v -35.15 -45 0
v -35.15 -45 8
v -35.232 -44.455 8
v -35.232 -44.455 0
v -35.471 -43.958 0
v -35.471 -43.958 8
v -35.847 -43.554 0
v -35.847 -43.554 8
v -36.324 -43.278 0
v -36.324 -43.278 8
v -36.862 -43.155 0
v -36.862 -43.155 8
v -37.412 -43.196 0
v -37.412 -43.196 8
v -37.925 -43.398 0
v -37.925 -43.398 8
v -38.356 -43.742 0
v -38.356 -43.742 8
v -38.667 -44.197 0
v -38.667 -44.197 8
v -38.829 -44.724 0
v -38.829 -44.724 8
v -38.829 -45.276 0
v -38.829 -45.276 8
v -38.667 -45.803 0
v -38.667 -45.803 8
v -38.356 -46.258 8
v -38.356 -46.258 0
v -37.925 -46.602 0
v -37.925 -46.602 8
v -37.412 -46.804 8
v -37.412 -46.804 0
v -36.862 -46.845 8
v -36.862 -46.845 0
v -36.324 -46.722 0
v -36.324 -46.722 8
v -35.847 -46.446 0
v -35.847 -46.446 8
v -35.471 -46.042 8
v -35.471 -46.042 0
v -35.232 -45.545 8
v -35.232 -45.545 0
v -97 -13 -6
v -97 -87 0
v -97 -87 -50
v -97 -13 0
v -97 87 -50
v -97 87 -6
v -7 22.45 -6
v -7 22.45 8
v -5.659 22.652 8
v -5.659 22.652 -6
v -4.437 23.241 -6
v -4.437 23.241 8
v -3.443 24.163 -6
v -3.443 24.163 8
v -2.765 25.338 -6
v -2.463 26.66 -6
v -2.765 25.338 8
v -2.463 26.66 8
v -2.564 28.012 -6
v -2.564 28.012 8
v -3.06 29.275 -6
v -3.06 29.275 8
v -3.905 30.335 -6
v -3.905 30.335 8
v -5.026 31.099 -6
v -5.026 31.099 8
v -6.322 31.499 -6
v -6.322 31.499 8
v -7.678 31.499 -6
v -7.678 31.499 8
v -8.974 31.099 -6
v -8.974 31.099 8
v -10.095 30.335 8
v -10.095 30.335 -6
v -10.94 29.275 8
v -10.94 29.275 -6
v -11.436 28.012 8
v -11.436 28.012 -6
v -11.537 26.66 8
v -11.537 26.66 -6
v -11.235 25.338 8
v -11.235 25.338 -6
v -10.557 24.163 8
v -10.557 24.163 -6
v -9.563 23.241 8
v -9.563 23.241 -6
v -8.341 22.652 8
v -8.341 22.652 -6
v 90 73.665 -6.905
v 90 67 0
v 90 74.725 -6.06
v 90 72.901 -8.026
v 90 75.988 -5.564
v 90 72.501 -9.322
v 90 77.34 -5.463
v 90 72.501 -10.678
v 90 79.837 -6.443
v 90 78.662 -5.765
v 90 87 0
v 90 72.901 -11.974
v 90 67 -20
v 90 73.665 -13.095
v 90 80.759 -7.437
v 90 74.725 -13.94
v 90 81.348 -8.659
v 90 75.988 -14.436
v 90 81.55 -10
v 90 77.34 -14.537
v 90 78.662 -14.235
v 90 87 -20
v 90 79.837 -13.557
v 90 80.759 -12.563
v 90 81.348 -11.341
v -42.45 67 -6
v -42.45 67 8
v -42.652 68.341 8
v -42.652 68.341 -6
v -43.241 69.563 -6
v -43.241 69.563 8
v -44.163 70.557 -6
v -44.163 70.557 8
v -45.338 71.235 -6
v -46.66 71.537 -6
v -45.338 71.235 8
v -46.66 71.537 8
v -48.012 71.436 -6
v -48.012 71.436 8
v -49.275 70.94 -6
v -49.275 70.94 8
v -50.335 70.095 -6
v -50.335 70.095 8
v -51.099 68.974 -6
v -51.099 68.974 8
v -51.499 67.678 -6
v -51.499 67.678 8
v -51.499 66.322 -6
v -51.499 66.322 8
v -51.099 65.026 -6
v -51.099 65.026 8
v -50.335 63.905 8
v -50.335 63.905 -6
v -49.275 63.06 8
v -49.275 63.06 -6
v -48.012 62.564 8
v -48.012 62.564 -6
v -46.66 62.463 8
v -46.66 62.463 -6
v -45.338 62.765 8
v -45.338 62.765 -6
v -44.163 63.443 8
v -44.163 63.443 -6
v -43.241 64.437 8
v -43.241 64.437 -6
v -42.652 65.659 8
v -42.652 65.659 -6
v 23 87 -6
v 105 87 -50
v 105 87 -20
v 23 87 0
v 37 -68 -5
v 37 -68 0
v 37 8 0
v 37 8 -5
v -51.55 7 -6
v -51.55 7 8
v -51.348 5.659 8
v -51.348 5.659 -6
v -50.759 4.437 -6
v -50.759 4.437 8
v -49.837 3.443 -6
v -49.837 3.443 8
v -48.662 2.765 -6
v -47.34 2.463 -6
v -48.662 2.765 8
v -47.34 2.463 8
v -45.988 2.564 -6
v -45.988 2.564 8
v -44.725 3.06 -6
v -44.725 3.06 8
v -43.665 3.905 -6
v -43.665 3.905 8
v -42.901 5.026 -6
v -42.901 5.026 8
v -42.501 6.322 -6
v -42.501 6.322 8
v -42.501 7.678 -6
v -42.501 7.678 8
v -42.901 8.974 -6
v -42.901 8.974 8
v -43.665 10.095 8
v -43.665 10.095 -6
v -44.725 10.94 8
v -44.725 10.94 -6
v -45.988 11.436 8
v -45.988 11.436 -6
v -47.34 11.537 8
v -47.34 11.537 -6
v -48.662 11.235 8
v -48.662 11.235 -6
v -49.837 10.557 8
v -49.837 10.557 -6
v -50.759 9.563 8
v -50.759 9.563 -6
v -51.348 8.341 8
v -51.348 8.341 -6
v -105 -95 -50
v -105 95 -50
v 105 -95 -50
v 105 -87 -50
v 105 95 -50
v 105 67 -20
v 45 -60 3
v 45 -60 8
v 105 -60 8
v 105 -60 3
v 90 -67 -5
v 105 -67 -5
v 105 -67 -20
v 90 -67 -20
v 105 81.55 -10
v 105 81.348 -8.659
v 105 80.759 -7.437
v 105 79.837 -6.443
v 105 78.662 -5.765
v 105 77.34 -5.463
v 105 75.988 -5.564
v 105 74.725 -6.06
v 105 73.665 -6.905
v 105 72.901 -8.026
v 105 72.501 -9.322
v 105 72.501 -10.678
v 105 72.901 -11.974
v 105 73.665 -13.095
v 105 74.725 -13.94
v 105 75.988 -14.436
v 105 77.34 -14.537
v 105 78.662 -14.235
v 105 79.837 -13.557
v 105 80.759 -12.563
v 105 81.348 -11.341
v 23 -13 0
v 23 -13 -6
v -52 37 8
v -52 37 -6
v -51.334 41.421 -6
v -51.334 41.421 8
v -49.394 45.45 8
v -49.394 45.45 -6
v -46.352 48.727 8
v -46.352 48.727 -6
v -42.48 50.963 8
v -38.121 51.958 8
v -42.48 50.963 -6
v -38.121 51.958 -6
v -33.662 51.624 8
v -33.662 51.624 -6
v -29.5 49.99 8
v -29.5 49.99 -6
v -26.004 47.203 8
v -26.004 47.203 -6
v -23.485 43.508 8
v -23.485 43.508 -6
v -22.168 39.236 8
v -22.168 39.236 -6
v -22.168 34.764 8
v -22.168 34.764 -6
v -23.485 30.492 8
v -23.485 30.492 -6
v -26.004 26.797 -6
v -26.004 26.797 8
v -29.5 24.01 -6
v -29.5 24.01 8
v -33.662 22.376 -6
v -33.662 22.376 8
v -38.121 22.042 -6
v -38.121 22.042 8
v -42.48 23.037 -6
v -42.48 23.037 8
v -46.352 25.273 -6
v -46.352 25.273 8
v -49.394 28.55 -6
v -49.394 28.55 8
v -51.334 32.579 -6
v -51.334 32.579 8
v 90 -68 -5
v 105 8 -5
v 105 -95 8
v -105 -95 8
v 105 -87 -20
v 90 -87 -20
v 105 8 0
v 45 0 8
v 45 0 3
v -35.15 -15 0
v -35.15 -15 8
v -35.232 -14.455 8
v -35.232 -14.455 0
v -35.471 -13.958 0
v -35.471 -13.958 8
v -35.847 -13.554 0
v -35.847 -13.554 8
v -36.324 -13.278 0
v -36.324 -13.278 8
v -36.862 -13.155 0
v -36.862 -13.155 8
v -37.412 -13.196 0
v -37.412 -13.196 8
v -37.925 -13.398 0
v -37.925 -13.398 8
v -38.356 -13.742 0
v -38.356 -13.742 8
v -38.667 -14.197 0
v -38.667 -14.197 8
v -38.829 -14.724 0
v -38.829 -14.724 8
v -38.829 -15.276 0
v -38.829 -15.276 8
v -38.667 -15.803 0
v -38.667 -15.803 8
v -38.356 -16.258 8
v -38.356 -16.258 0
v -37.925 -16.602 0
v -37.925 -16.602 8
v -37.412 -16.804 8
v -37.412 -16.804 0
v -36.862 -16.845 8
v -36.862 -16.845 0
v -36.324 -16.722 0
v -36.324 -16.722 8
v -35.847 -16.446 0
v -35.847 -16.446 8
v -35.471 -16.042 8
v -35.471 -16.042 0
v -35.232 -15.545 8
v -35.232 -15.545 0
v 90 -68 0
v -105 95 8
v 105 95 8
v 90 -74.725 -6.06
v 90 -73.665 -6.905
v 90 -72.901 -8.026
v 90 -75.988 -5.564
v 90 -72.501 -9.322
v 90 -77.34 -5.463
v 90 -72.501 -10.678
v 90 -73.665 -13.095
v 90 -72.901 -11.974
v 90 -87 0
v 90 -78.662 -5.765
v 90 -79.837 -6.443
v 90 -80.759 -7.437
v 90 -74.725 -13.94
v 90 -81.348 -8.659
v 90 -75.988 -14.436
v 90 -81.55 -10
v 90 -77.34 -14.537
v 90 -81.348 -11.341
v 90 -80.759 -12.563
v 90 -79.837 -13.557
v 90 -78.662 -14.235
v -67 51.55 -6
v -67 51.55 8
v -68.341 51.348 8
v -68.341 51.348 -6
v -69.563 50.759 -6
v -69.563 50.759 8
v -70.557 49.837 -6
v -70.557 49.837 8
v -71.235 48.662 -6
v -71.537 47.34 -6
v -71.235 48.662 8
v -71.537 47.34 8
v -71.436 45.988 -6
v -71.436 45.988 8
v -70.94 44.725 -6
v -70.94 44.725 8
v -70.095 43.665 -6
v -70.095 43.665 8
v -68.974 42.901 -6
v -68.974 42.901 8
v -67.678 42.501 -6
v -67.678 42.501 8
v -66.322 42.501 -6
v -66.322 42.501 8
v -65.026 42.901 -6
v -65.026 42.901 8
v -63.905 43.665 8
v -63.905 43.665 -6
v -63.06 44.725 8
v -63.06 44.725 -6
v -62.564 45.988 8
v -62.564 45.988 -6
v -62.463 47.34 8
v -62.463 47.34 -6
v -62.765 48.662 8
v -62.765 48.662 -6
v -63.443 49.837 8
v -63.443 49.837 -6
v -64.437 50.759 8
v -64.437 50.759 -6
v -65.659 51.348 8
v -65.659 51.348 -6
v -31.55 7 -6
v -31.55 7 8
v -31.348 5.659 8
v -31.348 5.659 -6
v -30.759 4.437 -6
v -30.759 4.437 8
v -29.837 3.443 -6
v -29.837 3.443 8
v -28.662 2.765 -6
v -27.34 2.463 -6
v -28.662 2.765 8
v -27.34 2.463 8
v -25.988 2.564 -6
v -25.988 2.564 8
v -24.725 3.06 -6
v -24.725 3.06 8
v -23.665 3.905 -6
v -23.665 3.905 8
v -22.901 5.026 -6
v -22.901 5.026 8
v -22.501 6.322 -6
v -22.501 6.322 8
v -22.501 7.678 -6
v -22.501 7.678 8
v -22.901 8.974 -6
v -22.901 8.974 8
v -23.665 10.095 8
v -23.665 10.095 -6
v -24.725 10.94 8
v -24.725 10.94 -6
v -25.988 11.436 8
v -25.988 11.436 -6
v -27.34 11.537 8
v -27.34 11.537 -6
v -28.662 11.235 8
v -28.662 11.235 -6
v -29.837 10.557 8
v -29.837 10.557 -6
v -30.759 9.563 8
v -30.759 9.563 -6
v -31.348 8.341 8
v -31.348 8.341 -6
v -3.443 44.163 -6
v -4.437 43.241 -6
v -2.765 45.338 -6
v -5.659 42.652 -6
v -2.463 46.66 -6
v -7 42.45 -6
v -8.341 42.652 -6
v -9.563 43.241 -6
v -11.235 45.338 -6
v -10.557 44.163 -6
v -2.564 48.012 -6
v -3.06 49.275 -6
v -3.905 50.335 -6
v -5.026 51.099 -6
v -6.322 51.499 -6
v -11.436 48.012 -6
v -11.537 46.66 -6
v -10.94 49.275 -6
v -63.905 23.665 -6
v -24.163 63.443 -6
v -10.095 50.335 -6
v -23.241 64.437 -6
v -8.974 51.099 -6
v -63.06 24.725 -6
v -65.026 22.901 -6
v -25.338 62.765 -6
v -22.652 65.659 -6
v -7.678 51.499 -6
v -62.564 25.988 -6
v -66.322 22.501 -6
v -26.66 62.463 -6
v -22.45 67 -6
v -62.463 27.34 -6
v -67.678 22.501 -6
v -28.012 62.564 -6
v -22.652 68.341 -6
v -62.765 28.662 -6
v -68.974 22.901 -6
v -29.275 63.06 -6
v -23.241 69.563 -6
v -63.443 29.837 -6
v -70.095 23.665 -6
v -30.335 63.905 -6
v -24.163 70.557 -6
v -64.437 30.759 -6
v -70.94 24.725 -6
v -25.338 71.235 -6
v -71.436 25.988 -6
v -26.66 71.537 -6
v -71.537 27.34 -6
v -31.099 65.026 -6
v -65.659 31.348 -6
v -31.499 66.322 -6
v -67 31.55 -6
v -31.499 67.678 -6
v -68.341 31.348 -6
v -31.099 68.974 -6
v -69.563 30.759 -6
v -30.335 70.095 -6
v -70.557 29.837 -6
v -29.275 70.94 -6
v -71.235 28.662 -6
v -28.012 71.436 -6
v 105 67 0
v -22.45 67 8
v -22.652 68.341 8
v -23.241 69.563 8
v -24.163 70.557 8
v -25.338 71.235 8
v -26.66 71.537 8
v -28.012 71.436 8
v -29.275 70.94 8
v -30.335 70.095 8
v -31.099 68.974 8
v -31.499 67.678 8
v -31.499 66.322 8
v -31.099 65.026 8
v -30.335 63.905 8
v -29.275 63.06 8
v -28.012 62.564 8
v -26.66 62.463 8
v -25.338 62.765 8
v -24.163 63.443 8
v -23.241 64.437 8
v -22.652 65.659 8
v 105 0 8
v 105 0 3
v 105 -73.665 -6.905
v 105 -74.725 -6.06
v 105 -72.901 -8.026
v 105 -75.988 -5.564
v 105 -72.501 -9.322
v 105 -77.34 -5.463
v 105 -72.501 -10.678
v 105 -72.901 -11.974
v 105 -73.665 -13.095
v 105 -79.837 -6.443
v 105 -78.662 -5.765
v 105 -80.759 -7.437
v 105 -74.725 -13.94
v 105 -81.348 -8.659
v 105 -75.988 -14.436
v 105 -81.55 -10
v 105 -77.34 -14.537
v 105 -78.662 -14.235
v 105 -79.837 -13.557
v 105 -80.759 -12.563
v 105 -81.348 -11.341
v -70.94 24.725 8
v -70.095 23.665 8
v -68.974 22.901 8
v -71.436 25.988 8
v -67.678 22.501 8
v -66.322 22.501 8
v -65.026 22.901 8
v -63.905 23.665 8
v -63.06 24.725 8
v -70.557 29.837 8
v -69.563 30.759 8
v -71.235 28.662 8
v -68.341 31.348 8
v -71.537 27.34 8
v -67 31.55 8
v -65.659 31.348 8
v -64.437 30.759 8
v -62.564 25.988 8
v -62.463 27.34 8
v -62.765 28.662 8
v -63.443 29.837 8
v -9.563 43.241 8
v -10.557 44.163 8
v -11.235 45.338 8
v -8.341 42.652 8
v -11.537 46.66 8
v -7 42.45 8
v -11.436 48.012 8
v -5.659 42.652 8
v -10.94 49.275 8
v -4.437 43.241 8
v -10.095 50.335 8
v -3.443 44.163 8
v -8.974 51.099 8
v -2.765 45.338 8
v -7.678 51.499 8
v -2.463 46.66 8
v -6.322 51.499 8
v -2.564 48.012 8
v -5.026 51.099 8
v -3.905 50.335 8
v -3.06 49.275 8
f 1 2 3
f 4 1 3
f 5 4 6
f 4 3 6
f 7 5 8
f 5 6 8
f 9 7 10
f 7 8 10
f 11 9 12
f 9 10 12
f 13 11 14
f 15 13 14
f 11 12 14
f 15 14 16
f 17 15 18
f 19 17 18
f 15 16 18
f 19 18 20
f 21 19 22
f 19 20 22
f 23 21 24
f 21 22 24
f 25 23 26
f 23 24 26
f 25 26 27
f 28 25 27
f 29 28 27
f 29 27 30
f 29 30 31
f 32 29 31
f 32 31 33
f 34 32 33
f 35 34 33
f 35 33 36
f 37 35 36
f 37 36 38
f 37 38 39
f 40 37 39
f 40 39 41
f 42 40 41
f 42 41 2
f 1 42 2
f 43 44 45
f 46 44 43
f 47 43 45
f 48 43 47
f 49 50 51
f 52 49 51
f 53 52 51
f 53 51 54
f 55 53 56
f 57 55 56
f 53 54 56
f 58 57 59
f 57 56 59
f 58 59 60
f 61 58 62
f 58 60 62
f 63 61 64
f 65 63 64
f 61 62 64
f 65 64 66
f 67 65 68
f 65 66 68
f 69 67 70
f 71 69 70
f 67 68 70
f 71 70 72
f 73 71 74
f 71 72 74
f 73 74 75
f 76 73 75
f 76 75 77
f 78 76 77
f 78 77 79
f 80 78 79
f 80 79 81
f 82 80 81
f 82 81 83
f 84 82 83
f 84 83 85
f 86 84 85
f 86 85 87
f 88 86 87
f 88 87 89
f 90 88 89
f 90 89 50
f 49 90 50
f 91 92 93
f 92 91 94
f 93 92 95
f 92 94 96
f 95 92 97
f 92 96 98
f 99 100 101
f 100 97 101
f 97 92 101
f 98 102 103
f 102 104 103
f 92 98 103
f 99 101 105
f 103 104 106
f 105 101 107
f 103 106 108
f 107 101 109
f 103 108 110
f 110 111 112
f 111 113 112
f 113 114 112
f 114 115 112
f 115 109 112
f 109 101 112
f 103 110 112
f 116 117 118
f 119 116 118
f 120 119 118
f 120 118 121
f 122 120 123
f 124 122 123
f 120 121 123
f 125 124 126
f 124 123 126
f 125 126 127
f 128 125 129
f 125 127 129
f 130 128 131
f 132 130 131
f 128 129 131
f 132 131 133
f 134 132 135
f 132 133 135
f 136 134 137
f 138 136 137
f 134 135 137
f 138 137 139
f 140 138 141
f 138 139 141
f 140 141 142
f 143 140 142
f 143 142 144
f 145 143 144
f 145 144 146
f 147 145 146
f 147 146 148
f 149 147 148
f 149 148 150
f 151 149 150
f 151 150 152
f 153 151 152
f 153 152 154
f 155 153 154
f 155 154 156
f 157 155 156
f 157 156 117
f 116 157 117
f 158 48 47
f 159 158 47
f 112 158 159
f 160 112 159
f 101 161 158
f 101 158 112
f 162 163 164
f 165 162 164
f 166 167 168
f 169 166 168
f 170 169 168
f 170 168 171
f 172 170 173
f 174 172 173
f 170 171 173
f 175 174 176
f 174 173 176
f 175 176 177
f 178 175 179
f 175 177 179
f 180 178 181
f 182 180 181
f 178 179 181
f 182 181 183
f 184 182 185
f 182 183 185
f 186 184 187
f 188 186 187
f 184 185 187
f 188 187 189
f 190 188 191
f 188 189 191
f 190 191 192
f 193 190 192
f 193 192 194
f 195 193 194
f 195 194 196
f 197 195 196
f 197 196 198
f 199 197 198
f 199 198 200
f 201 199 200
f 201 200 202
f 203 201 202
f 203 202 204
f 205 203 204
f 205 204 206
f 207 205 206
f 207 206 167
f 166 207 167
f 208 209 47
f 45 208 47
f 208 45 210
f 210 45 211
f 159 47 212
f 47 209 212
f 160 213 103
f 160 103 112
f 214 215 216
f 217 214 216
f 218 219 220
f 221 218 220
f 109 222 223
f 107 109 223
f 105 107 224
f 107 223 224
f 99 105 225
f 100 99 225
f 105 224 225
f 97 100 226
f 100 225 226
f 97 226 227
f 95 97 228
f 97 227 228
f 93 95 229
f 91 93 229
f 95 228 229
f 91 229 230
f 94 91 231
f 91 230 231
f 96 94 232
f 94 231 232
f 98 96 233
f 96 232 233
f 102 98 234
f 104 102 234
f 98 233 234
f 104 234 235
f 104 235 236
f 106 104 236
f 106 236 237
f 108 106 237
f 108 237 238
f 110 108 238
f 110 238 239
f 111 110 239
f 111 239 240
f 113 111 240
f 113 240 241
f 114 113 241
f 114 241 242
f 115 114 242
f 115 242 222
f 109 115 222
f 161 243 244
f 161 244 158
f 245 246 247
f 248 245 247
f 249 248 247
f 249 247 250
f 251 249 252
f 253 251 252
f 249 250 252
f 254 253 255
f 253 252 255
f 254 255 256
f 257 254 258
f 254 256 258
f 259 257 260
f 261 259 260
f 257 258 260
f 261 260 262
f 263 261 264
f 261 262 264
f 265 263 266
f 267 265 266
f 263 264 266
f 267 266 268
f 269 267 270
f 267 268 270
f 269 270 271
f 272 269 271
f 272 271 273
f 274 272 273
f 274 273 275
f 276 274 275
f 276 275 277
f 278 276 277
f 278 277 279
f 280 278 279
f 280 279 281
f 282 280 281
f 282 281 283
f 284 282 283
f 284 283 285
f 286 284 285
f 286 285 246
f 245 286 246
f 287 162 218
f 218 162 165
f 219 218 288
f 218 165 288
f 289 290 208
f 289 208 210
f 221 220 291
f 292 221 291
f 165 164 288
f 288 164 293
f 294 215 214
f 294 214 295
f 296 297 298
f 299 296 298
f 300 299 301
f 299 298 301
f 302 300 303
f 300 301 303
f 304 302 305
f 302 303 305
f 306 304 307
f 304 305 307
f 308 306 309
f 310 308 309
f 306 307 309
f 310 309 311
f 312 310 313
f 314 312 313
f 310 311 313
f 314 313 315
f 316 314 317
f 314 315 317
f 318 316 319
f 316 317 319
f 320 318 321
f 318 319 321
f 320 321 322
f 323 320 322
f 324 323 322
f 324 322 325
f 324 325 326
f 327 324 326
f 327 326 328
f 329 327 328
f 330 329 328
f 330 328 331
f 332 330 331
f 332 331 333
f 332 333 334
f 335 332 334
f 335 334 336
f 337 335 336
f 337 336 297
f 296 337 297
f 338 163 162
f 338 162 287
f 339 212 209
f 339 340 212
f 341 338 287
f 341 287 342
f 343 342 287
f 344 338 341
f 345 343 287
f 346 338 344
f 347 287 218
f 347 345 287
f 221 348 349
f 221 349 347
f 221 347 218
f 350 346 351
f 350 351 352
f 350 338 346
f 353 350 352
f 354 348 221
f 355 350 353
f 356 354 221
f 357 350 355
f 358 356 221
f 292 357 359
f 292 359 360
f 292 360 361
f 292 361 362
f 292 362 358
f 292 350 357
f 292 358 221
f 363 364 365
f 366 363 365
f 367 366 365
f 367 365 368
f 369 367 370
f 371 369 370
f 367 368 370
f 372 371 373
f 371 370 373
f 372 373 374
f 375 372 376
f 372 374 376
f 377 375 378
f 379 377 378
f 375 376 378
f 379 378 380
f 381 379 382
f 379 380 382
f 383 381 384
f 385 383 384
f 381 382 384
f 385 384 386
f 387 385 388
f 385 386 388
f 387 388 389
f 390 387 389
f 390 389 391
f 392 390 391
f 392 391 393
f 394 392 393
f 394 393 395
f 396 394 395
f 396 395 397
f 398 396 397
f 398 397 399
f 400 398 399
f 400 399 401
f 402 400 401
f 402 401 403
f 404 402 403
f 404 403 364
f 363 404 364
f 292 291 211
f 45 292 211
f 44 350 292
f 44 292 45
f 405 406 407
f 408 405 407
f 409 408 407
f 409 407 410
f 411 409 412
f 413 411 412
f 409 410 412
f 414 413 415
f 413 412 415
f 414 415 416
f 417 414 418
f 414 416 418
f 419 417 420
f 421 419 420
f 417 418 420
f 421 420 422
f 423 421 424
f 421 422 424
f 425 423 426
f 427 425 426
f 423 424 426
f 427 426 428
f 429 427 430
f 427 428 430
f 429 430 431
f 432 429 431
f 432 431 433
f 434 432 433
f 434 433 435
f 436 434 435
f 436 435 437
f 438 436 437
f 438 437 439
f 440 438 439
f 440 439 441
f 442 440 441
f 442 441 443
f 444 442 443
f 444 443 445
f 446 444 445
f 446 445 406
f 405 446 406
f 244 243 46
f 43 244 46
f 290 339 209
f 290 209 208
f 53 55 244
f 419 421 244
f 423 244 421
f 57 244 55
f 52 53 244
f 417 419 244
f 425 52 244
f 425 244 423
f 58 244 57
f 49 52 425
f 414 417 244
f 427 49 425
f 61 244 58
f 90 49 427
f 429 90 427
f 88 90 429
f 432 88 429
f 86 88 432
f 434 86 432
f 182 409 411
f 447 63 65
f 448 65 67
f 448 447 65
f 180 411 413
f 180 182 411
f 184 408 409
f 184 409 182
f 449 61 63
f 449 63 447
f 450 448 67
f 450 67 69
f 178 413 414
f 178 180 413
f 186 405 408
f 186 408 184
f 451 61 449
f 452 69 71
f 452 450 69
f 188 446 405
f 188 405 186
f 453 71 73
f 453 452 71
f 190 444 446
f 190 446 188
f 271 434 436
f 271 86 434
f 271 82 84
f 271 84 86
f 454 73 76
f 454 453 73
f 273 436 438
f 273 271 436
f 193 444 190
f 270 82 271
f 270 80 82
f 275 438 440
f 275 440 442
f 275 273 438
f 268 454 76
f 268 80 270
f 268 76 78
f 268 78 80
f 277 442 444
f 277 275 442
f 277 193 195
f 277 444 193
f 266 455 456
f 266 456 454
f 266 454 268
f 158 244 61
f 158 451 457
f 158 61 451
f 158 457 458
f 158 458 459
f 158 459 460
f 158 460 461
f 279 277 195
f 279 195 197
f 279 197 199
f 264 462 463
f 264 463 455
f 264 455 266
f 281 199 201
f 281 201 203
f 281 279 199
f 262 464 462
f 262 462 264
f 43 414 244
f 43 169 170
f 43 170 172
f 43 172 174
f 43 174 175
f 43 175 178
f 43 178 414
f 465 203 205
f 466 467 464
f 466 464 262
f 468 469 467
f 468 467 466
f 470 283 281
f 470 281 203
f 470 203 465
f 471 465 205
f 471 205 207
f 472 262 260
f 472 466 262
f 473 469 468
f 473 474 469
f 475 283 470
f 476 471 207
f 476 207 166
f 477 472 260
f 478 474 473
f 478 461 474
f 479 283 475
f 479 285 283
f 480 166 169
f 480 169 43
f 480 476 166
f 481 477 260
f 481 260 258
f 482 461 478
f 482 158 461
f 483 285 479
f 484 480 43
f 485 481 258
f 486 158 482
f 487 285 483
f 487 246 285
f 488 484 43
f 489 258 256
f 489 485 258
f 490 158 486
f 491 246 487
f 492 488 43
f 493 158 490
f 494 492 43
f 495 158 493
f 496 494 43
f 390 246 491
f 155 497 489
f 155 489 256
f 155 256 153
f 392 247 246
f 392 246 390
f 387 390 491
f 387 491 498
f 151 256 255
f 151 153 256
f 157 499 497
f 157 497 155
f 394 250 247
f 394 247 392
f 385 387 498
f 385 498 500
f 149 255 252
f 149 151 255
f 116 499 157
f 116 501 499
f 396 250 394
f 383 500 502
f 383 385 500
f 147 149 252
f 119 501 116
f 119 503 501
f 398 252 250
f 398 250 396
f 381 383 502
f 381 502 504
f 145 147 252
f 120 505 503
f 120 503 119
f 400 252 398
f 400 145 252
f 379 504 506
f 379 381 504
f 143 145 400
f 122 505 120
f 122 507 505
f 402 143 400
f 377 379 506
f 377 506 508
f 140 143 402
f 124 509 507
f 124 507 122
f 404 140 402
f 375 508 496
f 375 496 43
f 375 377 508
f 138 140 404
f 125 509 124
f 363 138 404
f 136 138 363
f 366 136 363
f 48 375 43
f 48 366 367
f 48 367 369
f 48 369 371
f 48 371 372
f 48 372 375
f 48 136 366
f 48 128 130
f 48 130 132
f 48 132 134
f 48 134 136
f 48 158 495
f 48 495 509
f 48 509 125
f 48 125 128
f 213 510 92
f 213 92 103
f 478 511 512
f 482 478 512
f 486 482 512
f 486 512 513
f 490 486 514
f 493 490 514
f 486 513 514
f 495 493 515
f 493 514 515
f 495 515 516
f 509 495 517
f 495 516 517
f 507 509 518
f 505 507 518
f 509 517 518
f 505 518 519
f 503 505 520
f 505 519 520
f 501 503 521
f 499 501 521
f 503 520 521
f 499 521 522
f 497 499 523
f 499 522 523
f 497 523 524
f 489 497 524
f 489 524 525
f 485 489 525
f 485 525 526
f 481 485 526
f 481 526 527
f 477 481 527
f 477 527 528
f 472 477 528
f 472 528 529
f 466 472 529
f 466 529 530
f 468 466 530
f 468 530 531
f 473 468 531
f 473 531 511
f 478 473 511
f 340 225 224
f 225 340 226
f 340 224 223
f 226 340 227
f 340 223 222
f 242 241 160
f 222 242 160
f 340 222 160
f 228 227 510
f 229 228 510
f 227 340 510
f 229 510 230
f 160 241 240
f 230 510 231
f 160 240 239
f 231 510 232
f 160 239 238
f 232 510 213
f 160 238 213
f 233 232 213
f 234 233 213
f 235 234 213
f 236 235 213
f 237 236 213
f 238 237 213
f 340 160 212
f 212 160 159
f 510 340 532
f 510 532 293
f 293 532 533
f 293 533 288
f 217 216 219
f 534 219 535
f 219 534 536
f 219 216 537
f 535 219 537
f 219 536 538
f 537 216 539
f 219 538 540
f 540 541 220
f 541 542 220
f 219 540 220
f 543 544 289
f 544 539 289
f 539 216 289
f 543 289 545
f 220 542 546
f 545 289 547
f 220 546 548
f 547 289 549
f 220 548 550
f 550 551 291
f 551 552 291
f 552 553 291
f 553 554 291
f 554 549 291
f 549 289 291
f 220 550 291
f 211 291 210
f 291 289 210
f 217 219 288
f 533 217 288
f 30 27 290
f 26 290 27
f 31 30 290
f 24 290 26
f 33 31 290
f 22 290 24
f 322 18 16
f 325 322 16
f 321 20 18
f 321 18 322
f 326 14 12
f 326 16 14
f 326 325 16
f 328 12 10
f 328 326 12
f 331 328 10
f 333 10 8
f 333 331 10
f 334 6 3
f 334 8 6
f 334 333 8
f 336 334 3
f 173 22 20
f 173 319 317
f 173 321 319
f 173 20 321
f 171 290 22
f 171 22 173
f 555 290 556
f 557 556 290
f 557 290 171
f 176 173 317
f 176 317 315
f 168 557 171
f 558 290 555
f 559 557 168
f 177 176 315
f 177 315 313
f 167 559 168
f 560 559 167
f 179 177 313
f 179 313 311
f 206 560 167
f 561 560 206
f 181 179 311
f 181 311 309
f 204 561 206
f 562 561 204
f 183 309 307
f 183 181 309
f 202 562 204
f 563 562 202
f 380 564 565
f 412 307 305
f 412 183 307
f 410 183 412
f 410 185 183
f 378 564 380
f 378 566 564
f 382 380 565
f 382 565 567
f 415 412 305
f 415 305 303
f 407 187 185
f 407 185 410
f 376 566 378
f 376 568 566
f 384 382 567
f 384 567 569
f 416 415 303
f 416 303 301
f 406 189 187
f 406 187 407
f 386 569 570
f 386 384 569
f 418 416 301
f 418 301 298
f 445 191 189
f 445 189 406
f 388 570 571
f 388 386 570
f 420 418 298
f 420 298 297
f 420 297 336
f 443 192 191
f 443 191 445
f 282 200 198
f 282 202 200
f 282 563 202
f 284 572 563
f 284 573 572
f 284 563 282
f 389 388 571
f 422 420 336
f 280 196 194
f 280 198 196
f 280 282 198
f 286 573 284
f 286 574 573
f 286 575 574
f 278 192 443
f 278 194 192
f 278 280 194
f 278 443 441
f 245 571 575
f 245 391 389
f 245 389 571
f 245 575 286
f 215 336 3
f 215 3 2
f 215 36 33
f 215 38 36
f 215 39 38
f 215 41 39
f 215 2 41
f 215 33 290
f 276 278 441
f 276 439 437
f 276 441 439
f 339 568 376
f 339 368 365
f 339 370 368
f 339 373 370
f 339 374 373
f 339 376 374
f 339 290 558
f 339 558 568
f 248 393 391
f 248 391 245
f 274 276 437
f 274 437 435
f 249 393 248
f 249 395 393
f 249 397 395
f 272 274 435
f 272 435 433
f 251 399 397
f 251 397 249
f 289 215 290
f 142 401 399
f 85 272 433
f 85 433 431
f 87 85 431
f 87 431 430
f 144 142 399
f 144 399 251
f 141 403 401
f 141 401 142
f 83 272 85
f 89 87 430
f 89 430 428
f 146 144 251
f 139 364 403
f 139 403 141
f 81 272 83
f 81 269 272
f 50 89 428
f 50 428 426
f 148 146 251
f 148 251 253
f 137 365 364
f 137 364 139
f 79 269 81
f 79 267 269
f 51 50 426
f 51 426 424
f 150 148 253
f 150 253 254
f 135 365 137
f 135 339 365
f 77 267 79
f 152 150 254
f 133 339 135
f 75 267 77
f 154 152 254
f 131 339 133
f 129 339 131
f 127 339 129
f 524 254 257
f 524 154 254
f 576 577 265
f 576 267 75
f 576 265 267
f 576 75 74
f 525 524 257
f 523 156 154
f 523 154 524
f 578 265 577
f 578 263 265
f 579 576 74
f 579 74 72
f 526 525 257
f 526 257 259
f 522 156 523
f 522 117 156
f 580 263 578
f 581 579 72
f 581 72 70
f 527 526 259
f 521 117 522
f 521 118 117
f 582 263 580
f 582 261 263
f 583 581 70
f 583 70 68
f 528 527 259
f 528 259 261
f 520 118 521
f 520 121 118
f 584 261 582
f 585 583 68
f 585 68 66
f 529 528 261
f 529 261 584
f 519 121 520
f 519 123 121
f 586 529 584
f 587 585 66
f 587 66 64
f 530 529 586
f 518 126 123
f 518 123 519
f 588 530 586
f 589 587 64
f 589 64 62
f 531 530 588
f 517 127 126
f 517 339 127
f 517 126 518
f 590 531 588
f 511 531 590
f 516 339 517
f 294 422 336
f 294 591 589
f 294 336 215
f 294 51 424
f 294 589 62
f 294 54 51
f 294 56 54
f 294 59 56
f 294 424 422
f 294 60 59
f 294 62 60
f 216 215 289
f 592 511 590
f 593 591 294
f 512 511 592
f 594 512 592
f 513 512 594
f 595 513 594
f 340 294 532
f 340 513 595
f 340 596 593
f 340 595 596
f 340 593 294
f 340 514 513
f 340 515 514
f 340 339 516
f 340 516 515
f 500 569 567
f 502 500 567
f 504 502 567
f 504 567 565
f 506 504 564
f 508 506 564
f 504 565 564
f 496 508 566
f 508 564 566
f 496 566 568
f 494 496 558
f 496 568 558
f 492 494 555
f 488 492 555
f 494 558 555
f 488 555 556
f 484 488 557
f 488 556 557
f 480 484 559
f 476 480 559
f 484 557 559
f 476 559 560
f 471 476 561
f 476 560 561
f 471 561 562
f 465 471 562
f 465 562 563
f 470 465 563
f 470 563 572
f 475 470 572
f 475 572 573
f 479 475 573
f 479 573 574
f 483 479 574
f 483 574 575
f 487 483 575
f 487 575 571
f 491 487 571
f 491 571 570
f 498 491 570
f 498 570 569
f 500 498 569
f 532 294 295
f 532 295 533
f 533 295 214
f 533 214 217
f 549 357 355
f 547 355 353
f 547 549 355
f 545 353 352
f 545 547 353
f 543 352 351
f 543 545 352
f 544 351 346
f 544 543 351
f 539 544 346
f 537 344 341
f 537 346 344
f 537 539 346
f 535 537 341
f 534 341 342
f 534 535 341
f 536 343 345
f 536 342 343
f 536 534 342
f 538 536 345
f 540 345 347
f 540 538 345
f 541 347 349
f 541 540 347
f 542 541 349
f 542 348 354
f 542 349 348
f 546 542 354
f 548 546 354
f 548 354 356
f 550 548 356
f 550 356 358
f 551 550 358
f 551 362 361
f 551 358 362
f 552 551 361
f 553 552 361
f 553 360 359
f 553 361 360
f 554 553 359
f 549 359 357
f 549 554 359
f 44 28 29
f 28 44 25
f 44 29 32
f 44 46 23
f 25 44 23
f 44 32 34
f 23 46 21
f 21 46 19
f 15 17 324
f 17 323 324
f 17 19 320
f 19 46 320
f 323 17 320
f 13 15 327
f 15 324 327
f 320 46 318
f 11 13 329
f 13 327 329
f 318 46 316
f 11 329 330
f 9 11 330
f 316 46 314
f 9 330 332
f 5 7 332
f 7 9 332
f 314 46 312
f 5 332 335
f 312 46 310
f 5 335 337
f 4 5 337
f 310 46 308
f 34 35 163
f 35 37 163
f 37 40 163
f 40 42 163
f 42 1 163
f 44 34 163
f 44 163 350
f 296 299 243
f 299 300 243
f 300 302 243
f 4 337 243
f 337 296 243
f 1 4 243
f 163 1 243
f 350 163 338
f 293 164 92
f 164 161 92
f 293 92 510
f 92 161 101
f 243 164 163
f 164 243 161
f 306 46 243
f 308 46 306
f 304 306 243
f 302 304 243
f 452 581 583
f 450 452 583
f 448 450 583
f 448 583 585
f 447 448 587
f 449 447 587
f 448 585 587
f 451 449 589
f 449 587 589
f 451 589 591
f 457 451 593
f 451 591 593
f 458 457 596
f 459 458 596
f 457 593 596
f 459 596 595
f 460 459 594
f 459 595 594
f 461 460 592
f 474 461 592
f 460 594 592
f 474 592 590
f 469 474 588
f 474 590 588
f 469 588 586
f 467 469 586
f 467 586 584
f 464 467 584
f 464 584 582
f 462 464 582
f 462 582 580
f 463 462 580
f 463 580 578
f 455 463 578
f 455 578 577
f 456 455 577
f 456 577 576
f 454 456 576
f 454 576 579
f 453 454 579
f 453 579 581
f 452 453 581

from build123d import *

# Parameters (mm, degrees)
SKETCH_1_W               = 210
SKETCH_1_H               = 190
EXTRUDE_1_DEPTH          = 8
EXTRUDE_2_DEPTH          = 50
SKETCH_3_W               = 20
SKETCH_3_H               = 20
EXTRUDE_3_DEPTH          = 15
SKETCH_8_R               = 4.55
CUT_EXTRUDE_1_DEPTH      = 25
SKETCH_9_W               = 120
SKETCH_9_H               = 100
EXTRUDE_4_DEPTH          = 12
SKETCH_10_R              = 15
CUT_EXTRUDE_2_DEPTH      = 147.608321728
SKETCH_13_R              = 4.55
CUT_EXTRUDE_3_DEPTH      = 154.016338997
PATTERN_CIRCULAR_2_COUNT = 4
SKETCH_14_W              = 120
SKETCH_14_H              = 100
CUT_EXTRUDE_4_DEPTH      = 6
SKETCH_15_R              = 1.85
CUT_EXTRUDE_5_DEPTH      = 10
SKETCH_16_W              = 68
SKETCH_16_H              = 76
EXTRUDE_5_DEPTH          = 13
SKETCH_17_W              = 60
SKETCH_17_H              = 60
CUT_EXTRUDE_6_DEPTH      = 5


with BuildPart() as part:
    # 스케치1 → 보스-돌출1 (new body)
    with BuildSketch(Plane.XY):
        Rectangle(SKETCH_1_W, SKETCH_1_H)
    extrude(amount=EXTRUDE_1_DEPTH)

    # 스케치2 → 보스-돌출2 (add)
    with BuildSketch(Plane(origin=(0, 0, 0), x_dir=(-1, 0, 0), z_dir=(0, 0, -1))):
        Polygon((-105, 95), (105, 95), (105, -95), (-105, -95), (-105, -87), (97, -87), (97, 87), (-105, 87), align=None)
    extrude(amount=EXTRUDE_2_DEPTH)

    # 스케치3 → 보스-돌출3 (add)
    with BuildSketch(Plane(origin=(105, 0, 0), x_dir=(0, 0, -1), z_dir=(1, 0, 0))):
        with Locations((10, 77)):
            Rectangle(SKETCH_3_W, SKETCH_3_H)
    extrude_3 = extrude(amount=-EXTRUDE_3_DEPTH)

    # 스케치8 → 컷-돌출1 (cut)
    with BuildSketch(Plane(origin=(105, 0, 0), x_dir=(0, 0, -1), z_dir=(1, 0, 0))):
        with Locations(Location((10, 77, 0), (0, 0, 90))):
            Circle(SKETCH_8_R)
    cut_extrude_1 = extrude(amount=-CUT_EXTRUDE_1_DEPTH, mode=Mode.SUBTRACT)

    # 대칭 복사1: 보스-돌출3, 컷-돌출1 across plane
    add(extrude_3.mirror(Plane(origin=(0, 0, 0), x_dir=(0, 0, 1), z_dir=(0, -1, 0))))
    add(cut_extrude_1.mirror(Plane(origin=(0, 0, 0), x_dir=(0, 0, 1), z_dir=(0, -1, 0))), mode=Mode.SUBTRACT)

    # 스케치9 → 보스-돌출4 (add)
    with BuildSketch(Plane(origin=(0, 0, 0), x_dir=(-1, 0, 0), z_dir=(0, 0, -1))):
        with Locations((37, 37)):
            Rectangle(SKETCH_9_W, SKETCH_9_H)
    extrude(amount=EXTRUDE_4_DEPTH)

    # 스케치10 → 컷-돌출2 (cut, through all)
    with BuildSketch(Plane(origin=(0, 0, -12), x_dir=(-1, 0, 0), z_dir=(0, 0, -1))):
        with Locations((37, 37)):
            Circle(SKETCH_10_R)
    extrude(amount=-CUT_EXTRUDE_2_DEPTH, mode=Mode.SUBTRACT)

    # 스케치13 → 컷-돌출3 (cut, through all)
    with BuildSketch(Plane.XY.offset(8)):
        with Locations((-47, 67)):
            Circle(SKETCH_13_R)
        with Locations((-27, 67)):
            Circle(SKETCH_13_R)
    cut_extrude_3 = extrude(amount=-CUT_EXTRUDE_3_DEPTH, mode=Mode.SUBTRACT)

    # 원형 패턴2: 컷-돌출3 ×4 about axis
    pattern_circular_2_axis = Axis((-37, 37, 0), (0, 0, 1))
    for i in range(1, PATTERN_CIRCULAR_2_COUNT):
        add(cut_extrude_3.rotate(pattern_circular_2_axis, i * 360 / PATTERN_CIRCULAR_2_COUNT), mode=Mode.SUBTRACT)

    # 스케치14 → 컷-돌출4 (cut)
    with BuildSketch(Plane(origin=(0, 0, -12), x_dir=(-1, 0, 0), z_dir=(0, 0, -1))):
        with Locations((37, 37)):
            Rectangle(SKETCH_14_W, SKETCH_14_H)
    extrude(amount=-CUT_EXTRUDE_4_DEPTH, mode=Mode.SUBTRACT)

    # 스케치15 → 컷-돌출5 (cut)
    with BuildSketch(Plane.XY.offset(8)):
        with Locations((-37, -45)):
            Circle(SKETCH_15_R)
        with Locations((-37, -15)):
            Circle(SKETCH_15_R)
    extrude(amount=-CUT_EXTRUDE_5_DEPTH, mode=Mode.SUBTRACT)

    # 스케치16 → 보스-돌출5 (add)
    with BuildSketch(Plane.XY.offset(8)):
        with Locations((71, -30)):
            Rectangle(SKETCH_16_W, SKETCH_16_H)
    extrude(amount=-EXTRUDE_5_DEPTH)

    # 스케치17 → 컷-돌출6 (cut)
    with BuildSketch(Plane.XY.offset(8)):
        with Locations((75, -30)):
            Rectangle(SKETCH_17_W, SKETCH_17_H)
    extrude(amount=-CUT_EXTRUDE_6_DEPTH, mode=Mode.SUBTRACT)


solid = part.part
